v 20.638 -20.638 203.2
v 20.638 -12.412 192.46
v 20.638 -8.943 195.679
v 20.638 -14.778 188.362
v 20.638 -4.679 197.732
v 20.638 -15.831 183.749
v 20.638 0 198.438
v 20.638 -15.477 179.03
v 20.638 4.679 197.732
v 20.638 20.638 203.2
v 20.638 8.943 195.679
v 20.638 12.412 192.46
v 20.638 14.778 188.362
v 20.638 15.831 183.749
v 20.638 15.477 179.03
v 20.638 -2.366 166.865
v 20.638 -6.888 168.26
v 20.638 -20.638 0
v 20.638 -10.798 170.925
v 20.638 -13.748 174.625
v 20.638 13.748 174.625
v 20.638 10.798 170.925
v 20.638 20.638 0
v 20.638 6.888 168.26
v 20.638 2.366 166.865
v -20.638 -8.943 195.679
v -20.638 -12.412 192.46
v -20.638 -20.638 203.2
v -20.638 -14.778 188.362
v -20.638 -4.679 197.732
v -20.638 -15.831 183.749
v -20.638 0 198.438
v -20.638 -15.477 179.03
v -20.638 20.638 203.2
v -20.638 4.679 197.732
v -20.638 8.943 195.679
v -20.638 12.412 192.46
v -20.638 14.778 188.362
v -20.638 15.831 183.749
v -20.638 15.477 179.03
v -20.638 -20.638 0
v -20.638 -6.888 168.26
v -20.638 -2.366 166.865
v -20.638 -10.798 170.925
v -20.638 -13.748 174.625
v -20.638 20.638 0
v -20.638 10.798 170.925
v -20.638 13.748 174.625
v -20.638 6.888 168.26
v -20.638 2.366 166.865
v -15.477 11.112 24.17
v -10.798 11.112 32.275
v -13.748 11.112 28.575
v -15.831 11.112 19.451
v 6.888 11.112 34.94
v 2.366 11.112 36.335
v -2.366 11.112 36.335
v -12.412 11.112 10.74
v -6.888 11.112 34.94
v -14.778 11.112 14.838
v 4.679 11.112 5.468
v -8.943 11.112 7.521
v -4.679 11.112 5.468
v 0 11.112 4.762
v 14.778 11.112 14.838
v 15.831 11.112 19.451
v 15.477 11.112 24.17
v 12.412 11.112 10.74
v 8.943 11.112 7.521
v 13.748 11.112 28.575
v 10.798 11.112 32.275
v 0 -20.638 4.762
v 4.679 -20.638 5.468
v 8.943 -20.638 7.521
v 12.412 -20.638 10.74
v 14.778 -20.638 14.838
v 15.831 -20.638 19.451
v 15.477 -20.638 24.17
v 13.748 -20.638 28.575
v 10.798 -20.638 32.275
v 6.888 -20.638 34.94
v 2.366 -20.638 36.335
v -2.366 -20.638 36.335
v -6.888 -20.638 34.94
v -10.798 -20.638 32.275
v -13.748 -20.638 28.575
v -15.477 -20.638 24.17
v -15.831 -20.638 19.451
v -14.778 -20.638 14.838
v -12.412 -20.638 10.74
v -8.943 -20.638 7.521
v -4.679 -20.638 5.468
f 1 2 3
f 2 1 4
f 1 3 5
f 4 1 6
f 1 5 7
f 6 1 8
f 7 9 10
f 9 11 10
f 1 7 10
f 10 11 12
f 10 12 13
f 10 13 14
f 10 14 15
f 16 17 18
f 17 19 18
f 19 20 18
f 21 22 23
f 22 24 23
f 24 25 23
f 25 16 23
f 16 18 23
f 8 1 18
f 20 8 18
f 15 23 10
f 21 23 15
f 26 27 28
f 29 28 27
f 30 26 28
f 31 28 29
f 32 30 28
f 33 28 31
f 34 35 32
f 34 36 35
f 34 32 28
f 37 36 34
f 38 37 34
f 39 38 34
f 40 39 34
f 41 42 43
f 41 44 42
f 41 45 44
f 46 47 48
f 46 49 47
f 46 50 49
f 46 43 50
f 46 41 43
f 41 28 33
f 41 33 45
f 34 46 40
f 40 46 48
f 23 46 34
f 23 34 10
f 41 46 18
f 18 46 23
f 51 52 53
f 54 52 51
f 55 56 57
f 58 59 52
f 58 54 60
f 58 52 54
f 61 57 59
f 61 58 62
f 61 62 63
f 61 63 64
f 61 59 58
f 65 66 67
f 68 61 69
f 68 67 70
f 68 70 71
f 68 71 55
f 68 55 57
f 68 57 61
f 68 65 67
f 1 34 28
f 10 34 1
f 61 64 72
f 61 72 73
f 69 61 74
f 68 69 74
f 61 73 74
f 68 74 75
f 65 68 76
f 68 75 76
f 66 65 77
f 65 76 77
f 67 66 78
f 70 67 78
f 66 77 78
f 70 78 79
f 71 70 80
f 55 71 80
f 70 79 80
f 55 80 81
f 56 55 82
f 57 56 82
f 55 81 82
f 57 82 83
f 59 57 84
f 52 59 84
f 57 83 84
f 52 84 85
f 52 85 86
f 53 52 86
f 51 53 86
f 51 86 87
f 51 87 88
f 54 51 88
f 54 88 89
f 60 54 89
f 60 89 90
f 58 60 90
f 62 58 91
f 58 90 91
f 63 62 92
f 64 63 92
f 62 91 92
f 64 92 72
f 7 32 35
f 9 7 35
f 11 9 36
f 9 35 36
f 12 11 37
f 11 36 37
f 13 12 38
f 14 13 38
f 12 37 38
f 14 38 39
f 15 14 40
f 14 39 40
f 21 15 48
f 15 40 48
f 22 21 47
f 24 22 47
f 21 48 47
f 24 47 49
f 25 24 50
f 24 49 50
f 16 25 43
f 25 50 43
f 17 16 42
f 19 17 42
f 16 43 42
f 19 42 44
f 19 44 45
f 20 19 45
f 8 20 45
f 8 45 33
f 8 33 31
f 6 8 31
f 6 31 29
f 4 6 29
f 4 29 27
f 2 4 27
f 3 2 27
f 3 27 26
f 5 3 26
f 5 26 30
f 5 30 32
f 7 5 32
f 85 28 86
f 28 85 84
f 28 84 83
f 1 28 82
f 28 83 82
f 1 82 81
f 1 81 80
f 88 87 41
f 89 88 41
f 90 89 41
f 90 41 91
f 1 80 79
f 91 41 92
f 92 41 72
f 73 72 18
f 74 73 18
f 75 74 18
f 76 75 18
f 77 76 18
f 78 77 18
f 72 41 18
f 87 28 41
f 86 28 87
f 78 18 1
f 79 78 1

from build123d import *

# Parameters (mm, degrees)
SKETCH1_W           = 41.275
SKETCH1_H           = 41.275
BOSS_EXTRUDE1_DEPTH = 203.2
SKETCH3_R           = 15.875
CUT_EXTRUDE2_DEPTH  = 31.75
SKETCH4_R           = 15.875
CUT_EXTRUDE3_DEPTH  = 209.37411555


with BuildPart() as part:
    # Sketch1 → Boss-Extrude1 (new body)
    with BuildSketch(Plane.XY):
        Rectangle(SKETCH1_W, SKETCH1_H)
    extrude(amount=BOSS_EXTRUDE1_DEPTH)

    # Sketch3 → Cut-Extrude2 (cut)
    with BuildSketch(Plane.XZ.offset(20.6375)):
        with Locations(Location((0, 20.6375, 0), (0, 0, 270))):
            Circle(SKETCH3_R)
    extrude(amount=-CUT_EXTRUDE2_DEPTH, mode=Mode.SUBTRACT)

    # Sketch4 → Cut-Extrude3 (cut, through all)
    with BuildSketch(Plane.ZY.offset(20.6375)):
        with Locations((182.5625, 0)):
            Circle(SKETCH4_R)
    extrude(amount=-CUT_EXTRUDE3_DEPTH, mode=Mode.SUBTRACT)


solid = part.part
